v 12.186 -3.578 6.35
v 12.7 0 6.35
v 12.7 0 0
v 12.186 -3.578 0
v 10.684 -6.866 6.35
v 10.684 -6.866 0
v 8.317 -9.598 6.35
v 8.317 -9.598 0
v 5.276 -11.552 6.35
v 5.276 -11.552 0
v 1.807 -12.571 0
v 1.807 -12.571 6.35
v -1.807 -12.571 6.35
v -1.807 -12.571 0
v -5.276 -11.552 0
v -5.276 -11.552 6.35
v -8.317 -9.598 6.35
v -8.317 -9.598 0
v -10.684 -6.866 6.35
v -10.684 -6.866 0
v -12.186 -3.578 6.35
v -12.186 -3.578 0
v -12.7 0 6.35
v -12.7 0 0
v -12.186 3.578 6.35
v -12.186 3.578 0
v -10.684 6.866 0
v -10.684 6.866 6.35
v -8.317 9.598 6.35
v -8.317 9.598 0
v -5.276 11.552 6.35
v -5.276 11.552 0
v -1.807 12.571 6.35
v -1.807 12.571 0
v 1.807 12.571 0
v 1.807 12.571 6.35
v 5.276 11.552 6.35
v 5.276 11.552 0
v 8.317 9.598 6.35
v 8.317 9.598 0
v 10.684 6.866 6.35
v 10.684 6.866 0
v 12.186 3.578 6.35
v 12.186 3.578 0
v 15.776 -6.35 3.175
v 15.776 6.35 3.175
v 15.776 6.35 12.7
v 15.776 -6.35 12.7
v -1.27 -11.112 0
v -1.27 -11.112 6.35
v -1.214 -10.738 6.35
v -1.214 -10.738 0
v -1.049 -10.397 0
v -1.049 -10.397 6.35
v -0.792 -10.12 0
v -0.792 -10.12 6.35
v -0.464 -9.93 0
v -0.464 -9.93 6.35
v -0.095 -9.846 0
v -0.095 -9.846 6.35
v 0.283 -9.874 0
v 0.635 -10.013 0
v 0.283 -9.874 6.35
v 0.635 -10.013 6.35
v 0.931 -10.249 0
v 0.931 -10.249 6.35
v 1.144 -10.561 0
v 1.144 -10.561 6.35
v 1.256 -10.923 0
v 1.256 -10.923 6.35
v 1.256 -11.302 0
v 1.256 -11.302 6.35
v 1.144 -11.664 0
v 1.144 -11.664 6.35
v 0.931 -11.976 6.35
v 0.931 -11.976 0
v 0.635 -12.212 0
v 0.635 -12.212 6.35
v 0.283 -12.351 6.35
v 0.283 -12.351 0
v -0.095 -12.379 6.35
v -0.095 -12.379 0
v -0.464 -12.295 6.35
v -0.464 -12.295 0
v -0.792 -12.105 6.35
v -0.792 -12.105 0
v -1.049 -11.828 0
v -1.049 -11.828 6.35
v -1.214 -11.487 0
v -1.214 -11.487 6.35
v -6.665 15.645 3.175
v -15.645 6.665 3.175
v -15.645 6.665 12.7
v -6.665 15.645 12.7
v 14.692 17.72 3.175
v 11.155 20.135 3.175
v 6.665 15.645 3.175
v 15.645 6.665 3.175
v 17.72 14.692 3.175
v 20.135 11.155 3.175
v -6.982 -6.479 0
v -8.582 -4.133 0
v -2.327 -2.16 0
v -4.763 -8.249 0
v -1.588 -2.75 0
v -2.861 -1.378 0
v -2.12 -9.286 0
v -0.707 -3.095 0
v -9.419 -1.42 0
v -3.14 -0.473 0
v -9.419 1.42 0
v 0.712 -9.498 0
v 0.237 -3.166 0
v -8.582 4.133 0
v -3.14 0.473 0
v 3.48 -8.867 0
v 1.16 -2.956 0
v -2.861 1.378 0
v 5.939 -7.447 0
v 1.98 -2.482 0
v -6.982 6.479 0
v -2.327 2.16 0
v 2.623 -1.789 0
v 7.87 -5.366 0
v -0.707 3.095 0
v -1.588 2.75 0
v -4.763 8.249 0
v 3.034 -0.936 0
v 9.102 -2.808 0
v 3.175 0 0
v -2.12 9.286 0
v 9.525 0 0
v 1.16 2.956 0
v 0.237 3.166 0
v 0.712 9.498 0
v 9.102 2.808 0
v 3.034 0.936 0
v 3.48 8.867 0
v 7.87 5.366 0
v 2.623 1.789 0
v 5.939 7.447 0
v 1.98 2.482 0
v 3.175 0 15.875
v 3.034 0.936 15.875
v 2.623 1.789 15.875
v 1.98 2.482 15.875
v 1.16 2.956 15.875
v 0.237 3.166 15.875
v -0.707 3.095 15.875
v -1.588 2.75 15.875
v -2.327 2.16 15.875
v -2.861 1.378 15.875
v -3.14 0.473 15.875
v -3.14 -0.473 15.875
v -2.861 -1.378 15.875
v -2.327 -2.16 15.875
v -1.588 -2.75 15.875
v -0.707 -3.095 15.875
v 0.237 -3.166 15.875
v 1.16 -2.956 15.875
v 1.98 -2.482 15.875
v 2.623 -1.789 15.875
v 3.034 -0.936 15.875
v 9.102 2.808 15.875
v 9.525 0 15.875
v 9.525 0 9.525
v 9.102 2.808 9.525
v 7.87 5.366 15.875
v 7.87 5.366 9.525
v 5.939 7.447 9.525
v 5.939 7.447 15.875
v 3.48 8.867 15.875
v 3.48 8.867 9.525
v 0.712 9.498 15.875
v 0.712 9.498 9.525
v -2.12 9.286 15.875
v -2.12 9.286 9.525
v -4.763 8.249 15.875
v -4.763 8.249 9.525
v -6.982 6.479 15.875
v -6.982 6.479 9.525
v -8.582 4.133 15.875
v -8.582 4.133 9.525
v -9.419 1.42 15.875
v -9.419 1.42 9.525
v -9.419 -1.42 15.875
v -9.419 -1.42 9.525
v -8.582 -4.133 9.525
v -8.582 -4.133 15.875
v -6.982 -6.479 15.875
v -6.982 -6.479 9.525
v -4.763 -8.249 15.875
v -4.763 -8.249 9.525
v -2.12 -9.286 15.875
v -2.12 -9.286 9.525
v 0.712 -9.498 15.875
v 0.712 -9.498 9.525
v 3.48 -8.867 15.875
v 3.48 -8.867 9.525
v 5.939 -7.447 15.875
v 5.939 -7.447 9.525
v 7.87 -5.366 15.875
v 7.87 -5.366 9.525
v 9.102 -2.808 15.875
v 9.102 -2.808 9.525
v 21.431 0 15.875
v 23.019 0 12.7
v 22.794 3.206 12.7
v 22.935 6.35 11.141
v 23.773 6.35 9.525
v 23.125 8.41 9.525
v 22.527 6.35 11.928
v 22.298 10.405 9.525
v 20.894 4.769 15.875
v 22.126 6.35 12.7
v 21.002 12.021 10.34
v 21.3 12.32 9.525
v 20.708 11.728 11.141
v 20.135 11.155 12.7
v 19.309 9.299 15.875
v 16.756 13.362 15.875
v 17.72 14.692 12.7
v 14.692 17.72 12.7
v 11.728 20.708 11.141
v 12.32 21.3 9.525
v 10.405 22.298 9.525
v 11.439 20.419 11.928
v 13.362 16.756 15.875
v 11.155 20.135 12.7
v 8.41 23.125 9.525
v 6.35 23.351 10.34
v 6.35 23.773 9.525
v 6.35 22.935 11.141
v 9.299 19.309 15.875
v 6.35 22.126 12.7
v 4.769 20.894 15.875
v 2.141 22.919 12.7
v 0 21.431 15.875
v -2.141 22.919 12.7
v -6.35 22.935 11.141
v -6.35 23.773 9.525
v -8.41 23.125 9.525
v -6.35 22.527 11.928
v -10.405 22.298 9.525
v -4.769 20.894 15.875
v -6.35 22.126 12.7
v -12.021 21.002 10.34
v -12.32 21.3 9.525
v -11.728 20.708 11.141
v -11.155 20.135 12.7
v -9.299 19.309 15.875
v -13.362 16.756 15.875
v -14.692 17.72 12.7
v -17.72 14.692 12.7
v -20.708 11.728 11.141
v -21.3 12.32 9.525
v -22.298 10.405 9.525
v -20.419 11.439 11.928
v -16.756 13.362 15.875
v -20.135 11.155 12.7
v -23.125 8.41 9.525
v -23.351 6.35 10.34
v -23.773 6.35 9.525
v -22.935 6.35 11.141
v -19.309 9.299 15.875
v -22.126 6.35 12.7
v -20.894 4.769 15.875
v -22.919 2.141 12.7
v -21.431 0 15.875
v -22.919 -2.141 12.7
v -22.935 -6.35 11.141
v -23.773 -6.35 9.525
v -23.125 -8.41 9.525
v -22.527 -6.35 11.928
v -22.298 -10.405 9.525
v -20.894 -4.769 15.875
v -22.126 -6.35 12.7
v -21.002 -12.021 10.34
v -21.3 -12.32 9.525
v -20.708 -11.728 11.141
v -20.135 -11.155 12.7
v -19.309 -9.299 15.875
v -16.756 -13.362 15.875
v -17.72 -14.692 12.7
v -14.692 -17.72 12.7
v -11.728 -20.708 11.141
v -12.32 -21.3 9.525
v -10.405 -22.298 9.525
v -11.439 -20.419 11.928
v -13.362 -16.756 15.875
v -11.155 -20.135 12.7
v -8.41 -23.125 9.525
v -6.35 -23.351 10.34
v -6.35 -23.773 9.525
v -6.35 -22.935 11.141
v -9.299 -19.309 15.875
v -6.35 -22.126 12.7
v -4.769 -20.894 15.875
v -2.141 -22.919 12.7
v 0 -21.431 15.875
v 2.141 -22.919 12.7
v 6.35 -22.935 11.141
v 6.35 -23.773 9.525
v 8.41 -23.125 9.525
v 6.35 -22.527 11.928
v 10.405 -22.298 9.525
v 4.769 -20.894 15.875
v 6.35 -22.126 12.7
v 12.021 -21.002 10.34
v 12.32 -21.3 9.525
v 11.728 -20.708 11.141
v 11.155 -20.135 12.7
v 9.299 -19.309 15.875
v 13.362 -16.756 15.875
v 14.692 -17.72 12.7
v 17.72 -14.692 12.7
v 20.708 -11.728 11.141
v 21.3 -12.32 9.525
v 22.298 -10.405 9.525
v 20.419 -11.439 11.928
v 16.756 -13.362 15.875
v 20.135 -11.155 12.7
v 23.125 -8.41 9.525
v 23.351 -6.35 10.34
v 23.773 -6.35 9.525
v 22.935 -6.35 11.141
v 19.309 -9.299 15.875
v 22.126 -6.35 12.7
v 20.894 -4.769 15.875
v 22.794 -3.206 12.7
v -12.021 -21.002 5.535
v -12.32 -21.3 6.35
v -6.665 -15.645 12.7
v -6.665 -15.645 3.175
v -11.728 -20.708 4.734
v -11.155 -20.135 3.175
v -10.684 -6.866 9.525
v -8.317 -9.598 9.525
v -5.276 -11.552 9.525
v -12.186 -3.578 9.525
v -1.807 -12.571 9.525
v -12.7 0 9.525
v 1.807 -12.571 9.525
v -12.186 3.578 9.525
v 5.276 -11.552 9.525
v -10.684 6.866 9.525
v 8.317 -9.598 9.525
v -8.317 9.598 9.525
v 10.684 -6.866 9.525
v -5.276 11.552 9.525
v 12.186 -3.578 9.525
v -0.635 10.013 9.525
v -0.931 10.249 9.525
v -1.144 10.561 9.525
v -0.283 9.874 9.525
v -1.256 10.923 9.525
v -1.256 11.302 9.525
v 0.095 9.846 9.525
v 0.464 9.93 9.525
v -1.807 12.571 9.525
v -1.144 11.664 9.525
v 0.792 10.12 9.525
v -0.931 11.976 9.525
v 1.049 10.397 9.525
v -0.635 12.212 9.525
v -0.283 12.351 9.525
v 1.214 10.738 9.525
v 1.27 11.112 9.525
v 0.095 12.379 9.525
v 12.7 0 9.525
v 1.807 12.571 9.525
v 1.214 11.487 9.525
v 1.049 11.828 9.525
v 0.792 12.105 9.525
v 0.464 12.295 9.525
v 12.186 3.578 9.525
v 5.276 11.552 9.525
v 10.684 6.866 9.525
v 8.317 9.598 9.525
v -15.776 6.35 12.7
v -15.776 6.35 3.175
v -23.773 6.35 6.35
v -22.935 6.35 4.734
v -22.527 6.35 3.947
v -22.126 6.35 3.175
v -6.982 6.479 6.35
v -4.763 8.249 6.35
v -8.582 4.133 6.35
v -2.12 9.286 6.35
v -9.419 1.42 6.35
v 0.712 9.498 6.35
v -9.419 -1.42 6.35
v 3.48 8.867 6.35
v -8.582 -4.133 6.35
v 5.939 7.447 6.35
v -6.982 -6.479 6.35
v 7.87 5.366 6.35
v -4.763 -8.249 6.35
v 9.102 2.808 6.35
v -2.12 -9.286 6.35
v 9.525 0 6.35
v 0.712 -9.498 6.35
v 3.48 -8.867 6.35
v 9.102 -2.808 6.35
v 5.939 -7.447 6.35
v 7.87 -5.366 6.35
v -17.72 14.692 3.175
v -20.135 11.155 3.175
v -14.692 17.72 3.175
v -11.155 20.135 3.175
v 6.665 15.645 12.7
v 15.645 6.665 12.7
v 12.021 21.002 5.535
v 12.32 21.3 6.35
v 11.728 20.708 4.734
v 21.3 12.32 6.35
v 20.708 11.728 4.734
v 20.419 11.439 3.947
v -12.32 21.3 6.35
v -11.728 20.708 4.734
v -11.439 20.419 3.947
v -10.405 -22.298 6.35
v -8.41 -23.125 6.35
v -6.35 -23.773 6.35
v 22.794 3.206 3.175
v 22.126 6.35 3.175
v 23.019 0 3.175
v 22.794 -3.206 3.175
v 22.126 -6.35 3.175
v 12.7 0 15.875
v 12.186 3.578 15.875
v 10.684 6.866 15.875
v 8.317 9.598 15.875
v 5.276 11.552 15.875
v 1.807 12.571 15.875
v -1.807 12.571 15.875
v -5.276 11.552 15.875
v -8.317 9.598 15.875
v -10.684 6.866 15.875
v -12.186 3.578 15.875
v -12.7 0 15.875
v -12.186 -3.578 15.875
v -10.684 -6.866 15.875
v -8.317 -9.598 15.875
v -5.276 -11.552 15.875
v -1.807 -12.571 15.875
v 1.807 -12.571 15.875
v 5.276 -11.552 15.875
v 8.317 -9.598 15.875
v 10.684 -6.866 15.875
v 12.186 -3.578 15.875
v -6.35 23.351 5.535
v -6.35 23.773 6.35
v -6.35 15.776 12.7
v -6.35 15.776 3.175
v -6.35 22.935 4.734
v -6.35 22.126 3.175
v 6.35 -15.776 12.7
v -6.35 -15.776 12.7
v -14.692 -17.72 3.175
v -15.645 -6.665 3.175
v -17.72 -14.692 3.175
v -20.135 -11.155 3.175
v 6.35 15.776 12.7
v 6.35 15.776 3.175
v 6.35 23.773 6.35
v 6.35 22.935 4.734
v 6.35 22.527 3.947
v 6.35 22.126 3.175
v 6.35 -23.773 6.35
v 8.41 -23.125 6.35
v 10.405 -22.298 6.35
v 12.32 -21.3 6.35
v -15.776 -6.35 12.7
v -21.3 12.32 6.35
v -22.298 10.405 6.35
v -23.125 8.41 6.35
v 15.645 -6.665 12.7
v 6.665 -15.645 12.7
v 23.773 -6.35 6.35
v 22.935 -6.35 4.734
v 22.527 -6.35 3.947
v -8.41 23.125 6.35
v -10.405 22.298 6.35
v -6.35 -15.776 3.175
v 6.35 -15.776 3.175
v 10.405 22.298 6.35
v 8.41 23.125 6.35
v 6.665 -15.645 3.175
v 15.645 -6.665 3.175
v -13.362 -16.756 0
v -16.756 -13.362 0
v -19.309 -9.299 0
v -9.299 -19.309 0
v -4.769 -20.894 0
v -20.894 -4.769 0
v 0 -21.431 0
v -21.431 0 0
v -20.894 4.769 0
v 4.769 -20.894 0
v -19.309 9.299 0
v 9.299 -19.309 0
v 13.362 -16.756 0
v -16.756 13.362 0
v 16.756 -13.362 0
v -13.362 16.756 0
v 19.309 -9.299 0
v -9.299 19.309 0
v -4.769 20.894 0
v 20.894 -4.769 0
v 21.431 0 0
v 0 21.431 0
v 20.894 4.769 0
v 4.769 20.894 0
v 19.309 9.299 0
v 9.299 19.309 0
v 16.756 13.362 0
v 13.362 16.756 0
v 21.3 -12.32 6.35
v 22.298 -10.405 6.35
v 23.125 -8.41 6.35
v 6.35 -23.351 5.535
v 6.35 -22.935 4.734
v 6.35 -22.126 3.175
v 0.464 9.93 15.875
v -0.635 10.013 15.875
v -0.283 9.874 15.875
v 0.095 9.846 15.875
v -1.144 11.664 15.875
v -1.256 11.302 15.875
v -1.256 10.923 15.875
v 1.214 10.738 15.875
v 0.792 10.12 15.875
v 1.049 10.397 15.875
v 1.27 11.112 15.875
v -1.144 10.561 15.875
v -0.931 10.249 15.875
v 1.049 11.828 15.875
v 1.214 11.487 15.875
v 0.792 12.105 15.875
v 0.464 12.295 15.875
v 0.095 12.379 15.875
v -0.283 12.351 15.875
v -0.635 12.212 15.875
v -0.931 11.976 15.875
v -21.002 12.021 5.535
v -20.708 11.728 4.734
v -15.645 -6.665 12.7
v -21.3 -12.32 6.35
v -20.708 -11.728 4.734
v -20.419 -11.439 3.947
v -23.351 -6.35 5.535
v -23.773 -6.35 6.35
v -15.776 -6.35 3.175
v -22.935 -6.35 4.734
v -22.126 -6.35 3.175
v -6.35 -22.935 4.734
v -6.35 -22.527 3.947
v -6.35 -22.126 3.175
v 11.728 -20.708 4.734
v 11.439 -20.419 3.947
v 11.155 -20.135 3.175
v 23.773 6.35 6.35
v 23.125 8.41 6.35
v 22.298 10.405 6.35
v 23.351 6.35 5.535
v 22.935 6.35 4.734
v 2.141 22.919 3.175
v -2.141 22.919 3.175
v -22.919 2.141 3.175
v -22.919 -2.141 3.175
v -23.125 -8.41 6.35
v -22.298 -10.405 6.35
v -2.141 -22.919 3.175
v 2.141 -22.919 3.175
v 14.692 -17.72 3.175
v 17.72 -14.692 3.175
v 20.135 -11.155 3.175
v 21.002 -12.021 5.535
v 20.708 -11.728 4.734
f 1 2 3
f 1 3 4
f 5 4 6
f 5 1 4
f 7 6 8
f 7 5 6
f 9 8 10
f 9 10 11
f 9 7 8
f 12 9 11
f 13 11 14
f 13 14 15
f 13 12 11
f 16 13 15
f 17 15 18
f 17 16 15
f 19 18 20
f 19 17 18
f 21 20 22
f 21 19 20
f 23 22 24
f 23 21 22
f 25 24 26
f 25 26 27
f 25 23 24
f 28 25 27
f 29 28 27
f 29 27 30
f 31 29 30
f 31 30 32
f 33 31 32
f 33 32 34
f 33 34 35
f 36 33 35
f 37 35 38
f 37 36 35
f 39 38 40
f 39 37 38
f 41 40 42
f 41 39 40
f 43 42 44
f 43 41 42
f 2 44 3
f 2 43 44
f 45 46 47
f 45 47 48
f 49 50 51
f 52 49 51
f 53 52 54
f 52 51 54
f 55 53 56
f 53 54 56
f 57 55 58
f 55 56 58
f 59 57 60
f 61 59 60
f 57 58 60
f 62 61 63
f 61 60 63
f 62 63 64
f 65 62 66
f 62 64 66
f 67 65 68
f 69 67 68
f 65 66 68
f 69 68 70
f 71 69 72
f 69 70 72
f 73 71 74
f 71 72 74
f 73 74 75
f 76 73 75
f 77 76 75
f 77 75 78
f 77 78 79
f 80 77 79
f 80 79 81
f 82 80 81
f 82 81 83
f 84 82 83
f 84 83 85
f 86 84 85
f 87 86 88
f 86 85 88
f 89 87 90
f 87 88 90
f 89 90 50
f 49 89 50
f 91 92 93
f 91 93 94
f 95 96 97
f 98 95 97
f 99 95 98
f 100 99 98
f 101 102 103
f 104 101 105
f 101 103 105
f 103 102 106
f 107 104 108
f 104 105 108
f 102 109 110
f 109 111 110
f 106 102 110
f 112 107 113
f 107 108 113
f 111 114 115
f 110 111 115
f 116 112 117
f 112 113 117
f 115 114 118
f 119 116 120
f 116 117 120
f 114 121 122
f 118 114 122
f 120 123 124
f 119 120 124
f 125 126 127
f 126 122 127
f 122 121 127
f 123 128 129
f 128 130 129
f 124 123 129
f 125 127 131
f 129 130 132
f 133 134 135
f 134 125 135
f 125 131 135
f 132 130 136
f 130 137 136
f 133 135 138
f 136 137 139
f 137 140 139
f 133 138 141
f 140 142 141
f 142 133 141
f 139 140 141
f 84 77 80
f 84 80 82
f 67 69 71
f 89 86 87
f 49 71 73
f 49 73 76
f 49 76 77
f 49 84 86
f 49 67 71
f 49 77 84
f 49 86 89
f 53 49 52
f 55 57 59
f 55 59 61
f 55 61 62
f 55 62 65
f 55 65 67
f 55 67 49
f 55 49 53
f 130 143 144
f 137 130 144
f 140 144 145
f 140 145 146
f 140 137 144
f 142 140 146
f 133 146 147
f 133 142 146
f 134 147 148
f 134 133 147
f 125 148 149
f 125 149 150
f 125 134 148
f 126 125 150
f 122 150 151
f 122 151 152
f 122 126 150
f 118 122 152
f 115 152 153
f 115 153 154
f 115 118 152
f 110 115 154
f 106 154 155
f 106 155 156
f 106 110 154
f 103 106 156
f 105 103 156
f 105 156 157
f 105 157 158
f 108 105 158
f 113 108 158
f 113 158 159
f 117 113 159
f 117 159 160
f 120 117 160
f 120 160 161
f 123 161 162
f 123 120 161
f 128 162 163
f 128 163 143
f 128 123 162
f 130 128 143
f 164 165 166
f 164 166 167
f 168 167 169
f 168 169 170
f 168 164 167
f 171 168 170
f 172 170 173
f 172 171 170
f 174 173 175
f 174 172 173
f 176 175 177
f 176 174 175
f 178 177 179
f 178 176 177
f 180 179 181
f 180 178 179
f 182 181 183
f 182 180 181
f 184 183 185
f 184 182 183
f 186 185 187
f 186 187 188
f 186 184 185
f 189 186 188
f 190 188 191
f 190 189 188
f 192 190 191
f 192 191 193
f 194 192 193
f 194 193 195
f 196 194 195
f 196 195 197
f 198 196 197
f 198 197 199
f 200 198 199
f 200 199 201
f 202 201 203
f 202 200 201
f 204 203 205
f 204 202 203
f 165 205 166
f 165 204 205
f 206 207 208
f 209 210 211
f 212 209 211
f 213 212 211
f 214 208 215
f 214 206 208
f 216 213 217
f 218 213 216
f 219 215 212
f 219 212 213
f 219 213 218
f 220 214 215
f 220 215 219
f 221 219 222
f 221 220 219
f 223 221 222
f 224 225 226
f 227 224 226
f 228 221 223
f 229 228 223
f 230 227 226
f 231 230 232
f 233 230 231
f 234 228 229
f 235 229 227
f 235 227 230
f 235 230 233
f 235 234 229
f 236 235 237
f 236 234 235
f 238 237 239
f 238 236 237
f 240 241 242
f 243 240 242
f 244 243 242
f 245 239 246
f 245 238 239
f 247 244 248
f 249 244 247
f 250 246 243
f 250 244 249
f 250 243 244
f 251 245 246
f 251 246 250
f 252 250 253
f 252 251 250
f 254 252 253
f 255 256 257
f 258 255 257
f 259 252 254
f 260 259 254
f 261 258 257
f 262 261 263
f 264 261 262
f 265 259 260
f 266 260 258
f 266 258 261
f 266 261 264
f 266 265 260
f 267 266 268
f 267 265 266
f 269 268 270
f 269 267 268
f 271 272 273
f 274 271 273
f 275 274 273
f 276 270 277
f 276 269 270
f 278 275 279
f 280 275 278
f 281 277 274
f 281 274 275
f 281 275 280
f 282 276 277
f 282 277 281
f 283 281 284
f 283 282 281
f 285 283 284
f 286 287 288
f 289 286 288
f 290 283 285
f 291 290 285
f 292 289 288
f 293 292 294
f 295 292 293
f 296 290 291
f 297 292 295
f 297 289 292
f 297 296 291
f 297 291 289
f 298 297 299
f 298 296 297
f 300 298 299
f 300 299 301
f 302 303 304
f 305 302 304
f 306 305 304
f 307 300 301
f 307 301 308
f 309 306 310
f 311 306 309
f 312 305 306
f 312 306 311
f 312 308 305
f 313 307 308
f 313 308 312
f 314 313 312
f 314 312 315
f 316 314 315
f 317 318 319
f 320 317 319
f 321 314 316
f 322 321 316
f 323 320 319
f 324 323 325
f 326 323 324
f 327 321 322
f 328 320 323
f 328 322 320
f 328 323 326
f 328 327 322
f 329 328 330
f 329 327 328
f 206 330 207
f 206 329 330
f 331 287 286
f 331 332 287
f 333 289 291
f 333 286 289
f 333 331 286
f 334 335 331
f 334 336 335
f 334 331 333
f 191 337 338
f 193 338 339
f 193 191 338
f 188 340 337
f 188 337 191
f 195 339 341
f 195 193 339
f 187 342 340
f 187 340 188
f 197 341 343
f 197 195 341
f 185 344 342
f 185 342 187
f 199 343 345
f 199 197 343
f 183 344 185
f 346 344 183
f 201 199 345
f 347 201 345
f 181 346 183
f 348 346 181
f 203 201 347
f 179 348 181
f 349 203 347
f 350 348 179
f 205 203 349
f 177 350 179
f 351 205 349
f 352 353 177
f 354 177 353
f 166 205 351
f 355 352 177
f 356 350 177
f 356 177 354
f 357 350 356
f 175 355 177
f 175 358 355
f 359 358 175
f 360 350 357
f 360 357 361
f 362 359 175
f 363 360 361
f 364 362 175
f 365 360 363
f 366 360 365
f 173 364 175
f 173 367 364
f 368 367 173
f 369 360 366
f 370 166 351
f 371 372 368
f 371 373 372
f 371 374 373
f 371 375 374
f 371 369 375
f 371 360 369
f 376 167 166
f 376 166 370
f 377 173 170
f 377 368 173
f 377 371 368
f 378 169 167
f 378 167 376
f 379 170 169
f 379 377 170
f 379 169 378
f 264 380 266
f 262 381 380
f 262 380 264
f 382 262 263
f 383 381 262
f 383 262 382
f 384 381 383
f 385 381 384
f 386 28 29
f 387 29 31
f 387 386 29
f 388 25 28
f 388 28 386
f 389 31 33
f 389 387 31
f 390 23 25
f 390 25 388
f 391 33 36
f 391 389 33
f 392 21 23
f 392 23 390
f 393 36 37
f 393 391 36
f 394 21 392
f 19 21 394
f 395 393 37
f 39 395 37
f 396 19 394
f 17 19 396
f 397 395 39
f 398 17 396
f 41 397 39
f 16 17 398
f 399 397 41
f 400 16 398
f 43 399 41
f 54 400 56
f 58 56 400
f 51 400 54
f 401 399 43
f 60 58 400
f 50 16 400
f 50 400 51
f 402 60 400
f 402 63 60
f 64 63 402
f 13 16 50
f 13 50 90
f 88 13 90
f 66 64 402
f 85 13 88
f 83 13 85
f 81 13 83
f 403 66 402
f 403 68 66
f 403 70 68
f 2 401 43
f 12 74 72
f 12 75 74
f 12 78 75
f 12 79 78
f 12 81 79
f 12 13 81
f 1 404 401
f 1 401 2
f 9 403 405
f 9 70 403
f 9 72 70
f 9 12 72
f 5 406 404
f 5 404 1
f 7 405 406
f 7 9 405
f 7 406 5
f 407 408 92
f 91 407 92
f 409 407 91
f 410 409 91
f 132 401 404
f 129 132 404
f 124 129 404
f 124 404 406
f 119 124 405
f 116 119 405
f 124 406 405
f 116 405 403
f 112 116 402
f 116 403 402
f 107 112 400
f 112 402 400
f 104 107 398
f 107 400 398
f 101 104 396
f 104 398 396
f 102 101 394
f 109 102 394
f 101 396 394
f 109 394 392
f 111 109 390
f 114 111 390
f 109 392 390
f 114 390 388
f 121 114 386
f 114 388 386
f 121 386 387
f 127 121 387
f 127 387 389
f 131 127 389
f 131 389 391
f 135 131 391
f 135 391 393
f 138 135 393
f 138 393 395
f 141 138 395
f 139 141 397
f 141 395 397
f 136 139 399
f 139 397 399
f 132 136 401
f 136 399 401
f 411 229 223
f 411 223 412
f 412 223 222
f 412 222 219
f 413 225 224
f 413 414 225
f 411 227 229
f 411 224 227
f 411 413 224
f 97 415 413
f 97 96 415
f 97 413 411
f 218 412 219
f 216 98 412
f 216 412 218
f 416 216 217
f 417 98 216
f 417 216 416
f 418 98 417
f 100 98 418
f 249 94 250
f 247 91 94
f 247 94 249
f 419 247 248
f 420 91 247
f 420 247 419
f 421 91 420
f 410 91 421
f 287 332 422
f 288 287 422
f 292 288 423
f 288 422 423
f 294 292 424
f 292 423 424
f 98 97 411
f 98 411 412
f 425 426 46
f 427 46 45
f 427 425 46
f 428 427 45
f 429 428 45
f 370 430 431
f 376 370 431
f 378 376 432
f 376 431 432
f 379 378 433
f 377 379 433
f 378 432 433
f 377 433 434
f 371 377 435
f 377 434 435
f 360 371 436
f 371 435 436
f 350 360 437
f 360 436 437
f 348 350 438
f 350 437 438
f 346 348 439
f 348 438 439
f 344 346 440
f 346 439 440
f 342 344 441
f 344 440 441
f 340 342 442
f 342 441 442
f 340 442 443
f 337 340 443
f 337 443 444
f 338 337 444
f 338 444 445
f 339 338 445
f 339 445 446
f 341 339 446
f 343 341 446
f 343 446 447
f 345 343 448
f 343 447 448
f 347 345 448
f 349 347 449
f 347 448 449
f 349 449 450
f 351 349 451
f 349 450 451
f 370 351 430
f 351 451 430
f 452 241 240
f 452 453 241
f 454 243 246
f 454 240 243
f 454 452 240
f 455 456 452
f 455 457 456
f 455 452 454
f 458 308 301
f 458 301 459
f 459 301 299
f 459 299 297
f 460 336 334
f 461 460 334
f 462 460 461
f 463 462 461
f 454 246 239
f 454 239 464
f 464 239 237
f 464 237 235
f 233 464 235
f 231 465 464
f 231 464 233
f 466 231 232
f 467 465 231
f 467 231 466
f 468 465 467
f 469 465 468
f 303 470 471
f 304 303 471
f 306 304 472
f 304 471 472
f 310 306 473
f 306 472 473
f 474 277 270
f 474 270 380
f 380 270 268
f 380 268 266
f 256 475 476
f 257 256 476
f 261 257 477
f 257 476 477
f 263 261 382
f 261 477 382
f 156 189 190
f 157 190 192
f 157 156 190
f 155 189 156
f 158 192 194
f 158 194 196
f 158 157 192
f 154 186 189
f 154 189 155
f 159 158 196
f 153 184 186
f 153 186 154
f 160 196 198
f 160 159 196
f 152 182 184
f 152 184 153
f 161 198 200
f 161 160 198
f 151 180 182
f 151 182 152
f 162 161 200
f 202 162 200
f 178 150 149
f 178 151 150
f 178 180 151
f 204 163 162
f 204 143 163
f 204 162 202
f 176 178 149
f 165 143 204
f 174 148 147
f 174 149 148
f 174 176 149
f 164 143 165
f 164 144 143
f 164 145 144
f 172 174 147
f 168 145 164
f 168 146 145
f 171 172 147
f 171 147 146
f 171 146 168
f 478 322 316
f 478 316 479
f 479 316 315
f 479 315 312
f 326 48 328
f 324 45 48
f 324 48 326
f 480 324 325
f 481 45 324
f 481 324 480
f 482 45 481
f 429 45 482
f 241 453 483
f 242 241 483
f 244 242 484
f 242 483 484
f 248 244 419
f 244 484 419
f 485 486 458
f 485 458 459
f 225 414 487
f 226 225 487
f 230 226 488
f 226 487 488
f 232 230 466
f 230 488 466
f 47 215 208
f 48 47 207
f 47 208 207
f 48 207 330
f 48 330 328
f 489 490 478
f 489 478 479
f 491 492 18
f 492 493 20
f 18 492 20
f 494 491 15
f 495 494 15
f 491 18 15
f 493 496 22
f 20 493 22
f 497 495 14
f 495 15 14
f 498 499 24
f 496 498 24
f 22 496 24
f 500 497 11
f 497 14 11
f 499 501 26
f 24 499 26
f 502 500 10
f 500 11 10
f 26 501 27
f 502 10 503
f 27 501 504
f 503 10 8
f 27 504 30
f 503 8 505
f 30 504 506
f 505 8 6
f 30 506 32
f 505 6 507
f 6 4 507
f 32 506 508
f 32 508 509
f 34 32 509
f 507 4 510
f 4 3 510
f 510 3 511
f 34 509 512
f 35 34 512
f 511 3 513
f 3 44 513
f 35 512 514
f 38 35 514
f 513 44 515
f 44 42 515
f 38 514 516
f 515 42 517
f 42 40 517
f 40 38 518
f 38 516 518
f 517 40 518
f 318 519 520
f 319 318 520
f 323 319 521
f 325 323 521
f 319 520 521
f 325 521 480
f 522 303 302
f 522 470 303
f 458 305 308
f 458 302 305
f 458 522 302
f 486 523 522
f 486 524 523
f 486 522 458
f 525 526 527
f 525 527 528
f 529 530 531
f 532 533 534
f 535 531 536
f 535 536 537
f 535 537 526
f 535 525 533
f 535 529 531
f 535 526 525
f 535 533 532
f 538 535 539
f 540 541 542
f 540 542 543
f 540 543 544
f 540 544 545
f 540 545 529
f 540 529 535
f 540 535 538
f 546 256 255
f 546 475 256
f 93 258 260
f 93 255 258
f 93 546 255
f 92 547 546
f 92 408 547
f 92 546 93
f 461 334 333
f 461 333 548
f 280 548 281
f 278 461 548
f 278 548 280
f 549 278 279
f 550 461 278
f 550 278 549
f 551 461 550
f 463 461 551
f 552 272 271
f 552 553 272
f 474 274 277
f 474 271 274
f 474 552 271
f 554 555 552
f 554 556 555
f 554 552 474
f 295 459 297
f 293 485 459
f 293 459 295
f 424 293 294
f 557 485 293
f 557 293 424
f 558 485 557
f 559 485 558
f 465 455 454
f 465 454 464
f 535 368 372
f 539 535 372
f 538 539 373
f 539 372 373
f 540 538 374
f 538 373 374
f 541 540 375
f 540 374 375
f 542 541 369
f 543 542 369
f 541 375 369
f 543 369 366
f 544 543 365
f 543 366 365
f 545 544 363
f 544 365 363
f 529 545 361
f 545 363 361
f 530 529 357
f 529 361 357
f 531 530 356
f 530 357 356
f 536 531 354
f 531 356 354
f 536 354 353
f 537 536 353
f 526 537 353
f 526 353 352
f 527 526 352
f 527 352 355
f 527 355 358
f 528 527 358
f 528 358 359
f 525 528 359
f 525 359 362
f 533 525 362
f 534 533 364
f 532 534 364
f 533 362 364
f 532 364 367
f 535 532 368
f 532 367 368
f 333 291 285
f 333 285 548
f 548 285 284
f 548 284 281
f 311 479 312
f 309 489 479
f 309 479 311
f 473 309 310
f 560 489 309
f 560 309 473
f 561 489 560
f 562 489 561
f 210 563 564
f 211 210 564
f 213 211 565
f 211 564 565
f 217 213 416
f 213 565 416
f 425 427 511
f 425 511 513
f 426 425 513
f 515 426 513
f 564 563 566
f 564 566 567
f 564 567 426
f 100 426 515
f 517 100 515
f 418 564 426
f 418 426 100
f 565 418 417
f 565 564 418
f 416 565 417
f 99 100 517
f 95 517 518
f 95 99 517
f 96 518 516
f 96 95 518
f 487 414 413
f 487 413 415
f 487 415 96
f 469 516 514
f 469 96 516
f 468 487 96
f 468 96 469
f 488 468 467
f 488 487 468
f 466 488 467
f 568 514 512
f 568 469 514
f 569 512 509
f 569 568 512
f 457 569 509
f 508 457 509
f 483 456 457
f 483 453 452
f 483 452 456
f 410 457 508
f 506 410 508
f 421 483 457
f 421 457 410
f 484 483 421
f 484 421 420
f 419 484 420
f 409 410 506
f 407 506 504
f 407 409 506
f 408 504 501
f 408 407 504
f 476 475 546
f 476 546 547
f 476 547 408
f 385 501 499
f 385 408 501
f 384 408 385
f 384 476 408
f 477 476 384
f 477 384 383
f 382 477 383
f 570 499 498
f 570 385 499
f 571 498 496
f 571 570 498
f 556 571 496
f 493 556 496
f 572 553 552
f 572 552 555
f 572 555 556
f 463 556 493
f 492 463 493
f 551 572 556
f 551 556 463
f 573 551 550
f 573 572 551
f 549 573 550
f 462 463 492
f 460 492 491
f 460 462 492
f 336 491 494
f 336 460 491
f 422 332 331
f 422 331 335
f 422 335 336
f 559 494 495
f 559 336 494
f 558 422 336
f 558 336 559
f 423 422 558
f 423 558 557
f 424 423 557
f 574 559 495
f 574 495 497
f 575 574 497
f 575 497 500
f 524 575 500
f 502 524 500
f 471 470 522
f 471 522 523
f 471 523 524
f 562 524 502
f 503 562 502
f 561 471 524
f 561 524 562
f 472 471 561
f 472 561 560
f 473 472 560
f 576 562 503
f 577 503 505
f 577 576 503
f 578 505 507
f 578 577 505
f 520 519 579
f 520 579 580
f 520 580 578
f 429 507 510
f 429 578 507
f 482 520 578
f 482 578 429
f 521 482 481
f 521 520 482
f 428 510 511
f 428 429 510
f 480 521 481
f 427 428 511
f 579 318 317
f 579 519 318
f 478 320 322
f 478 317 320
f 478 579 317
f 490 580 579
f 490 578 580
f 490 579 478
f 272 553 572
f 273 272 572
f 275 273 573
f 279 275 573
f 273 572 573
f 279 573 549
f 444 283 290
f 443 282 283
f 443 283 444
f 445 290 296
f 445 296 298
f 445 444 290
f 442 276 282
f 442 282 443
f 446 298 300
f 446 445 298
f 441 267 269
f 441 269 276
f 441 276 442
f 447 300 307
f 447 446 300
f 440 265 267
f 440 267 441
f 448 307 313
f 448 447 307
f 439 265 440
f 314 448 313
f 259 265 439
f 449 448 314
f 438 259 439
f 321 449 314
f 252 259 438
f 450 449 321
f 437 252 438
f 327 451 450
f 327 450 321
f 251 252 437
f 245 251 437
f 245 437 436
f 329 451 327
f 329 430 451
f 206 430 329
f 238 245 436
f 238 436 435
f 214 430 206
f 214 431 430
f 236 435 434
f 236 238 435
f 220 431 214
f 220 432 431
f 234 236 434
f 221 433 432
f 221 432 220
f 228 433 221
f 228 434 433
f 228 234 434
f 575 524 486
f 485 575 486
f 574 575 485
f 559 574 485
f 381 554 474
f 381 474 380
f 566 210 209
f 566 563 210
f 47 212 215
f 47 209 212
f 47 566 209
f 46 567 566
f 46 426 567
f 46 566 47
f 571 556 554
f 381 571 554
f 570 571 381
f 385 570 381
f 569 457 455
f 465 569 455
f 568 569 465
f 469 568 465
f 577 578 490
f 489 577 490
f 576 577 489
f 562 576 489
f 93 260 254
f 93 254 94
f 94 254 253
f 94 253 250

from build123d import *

# Parameters (mm, degrees)
SKETCH1_R           = 24.60625
SKETCH1_R_2         = 3.175
BOSS_EXTRUDE1_DEPTH = 15.875
SKETCH2_R           = 12.7
SKETCH2_R_2         = 9.525
CUT_EXTRUDE1_DEPTH  = 6.35
CUT_EXTRUDE3_START  = -6.35
SKETCH4_R           = 12.7
SKETCH4_R_2         = 9.525
CUT_EXTRUDE3_DEPTH  = 6.35
CHAMFER1_SIZE       = 3.175
CHAMFER1_SIZE2      = 6.35
CHAMFER2_SIZE       = 6.35
CHAMFER2_SIZE2      = 3.175
CUT_EXTRUDE5_DEPTH  = 39.248538575
CIRPATTERN2_COUNT   = 8
SKETCH6_R           = 1.27
BOSS_EXTRUDE2_DEPTH = 6.35
SKETCH9_R           = 1.27
BOSS_EXTRUDE3_DEPTH = 6.35
CUT_EXTRUDE6_REACH  = 43.528
CIRPATTERN3_COUNT   = 8
SKETCH16_W          = 12.7
SKETCH16_H          = 9.525
CUT_EXTRUDE7_DEPTH  = 6.35
CIRPATTERN4_COUNT   = 8


with BuildPart() as part:
    # Sketch1 → Boss-Extrude1 (new body)
    with BuildSketch(Plane.XY):
        Circle(SKETCH1_R)
        Circle(SKETCH1_R_2, mode=Mode.SUBTRACT)
    extrude(amount=BOSS_EXTRUDE1_DEPTH)

    # Sketch2 → Cut-Extrude1 (cut)
    with BuildSketch(Plane.XY.offset(15.875)):
        Circle(SKETCH2_R)
        Circle(SKETCH2_R_2, mode=Mode.SUBTRACT)
    extrude(amount=-CUT_EXTRUDE1_DEPTH, mode=Mode.SUBTRACT)

    # Sketch4 → Cut-Extrude3 (cut)
    with BuildSketch(Plane(origin=(0, 0, 0), x_dir=(-1, 0, 0), z_dir=(0, 0, -1)).offset(CUT_EXTRUDE3_START)):
        Circle(SKETCH4_R)
        Circle(SKETCH4_R_2, mode=Mode.SUBTRACT)
    extrude(amount=CUT_EXTRUDE3_DEPTH, mode=Mode.SUBTRACT)

    # Chamfer1
    chamfer1_edges = [part.edges().sort_by_distance(p)[0] for p in [
        (-24.60625, 0, 0),
    ]]
    chamfer1_side = [part.faces().sort_by_distance(p)[0] for p in [
        (-23.910280151, 0, 0),
    ]]
    chamfer(chamfer1_edges, length=CHAMFER1_SIZE, length2=CHAMFER1_SIZE2, reference=chamfer1_side[0])

    # Chamfer2
    chamfer2_edges = [part.edges().sort_by_distance(p)[0] for p in [
        (-24.60625, 0, 15.875),
    ]]
    chamfer2_side = [part.faces().sort_by_distance(p)[0] for p in [
        (-24.60625, 0, 11.1125),
    ]]
    chamfer(chamfer2_edges, length=CHAMFER2_SIZE, length2=CHAMFER2_SIZE2, reference=chamfer2_side[0])

    # Sketch5 → Cut-Extrude5 (cut, through all)
    with BuildSketch(Plane(origin=(0, 0, 0), x_dir=(-1, 0, 0), z_dir=(0, 0, -1))):
        with BuildLine():
            Line((-6.35, 26.286223353), (6.35, 26.286223353))
            Line((6.35, 26.286223353), (6.35, 22.125558785))
            ThreePointArc((6.35, 22.125558785), (0, 23.01875), (-6.35, 22.125558785))
            Line((-6.35, 22.125558785), (-6.35, 26.286223353))
        make_face()
    cut_extrude5 = extrude(amount=-CUT_EXTRUDE5_DEPTH, mode=Mode.SUBTRACT)

    # CirPattern2: Cut-Extrude5 ×8 about axis
    cirpattern2_axis = Axis((0, 0, 15.875), (0, 0, -1))
    for i in range(1, CIRPATTERN2_COUNT):
        add(cut_extrude5.rotate(cirpattern2_axis, i * 360 / CIRPATTERN2_COUNT), mode=Mode.SUBTRACT)

    # Sketch6 → Boss-Extrude2 (add)
    with BuildSketch(Plane(origin=(0, 0, 6.35), x_dir=(-1, 0, 0), z_dir=(0, 0, -1))):
        with Locations((0, -11.1125)):
            Circle(SKETCH6_R)
    extrude(amount=BOSS_EXTRUDE2_DEPTH)

    # Sketch9 → Boss-Extrude3 (add)
    with BuildSketch(Plane.XY.offset(9.525)):
        with Locations((0, 11.1125)):
            Circle(SKETCH9_R)
    extrude(amount=BOSS_EXTRUDE3_DEPTH)

    # Sketch14 → Cut-Extrude6 (cut, up to next)
    with BuildSketch(Plane.ZY.offset(-6.35), mode=Mode.PRIVATE) as cut_extrude6_sk1:
        Polygon((6.35, 23.772779372), (9.525, 23.772779372), (12.7, 22.125558785), (3.175, 22.125558785), align=None)
    cut_extrude6_tool1 = extrude(cut_extrude6_sk1.sketch, amount=CUT_EXTRUDE6_REACH, mode=Mode.PRIVATE) & part.part
    cut_extrude6 = cut_extrude6_tool1.solids().sort_by_distance((6.35, 22.811901, 7.9375))[0]
    add(cut_extrude6, mode=Mode.SUBTRACT)

    # CirPattern3: Cut-Extrude6 ×8 about axis
    cirpattern3_axis = Axis((0, 0, 15.875), (0, 0, -1))
    for i in range(1, CIRPATTERN3_COUNT):
        add(cut_extrude6.rotate(cirpattern3_axis, i * 360 / CIRPATTERN3_COUNT), mode=Mode.SUBTRACT)

    # Sketch16 → Cut-Extrude7 (cut, symmetric)
    with BuildSketch(Plane(origin=(0, 22.125558785, 0), x_dir=(1, 0, 0), z_dir=(0, 1, 0))):
        with Locations((0, -7.9375)):
            Rectangle(SKETCH16_W, SKETCH16_H)
    cut_extrude7 = extrude(amount=CUT_EXTRUDE7_DEPTH, both=True, mode=Mode.SUBTRACT)

    # CirPattern4: Cut-Extrude7 ×8 about axis
    cirpattern4_axis = Axis((0, 0, 15.875), (0, 0, -1))
    for i in range(1, CIRPATTERN4_COUNT):
        add(cut_extrude7.rotate(cirpattern4_axis, i * 360 / CIRPATTERN4_COUNT), mode=Mode.SUBTRACT)


solid = part.part
